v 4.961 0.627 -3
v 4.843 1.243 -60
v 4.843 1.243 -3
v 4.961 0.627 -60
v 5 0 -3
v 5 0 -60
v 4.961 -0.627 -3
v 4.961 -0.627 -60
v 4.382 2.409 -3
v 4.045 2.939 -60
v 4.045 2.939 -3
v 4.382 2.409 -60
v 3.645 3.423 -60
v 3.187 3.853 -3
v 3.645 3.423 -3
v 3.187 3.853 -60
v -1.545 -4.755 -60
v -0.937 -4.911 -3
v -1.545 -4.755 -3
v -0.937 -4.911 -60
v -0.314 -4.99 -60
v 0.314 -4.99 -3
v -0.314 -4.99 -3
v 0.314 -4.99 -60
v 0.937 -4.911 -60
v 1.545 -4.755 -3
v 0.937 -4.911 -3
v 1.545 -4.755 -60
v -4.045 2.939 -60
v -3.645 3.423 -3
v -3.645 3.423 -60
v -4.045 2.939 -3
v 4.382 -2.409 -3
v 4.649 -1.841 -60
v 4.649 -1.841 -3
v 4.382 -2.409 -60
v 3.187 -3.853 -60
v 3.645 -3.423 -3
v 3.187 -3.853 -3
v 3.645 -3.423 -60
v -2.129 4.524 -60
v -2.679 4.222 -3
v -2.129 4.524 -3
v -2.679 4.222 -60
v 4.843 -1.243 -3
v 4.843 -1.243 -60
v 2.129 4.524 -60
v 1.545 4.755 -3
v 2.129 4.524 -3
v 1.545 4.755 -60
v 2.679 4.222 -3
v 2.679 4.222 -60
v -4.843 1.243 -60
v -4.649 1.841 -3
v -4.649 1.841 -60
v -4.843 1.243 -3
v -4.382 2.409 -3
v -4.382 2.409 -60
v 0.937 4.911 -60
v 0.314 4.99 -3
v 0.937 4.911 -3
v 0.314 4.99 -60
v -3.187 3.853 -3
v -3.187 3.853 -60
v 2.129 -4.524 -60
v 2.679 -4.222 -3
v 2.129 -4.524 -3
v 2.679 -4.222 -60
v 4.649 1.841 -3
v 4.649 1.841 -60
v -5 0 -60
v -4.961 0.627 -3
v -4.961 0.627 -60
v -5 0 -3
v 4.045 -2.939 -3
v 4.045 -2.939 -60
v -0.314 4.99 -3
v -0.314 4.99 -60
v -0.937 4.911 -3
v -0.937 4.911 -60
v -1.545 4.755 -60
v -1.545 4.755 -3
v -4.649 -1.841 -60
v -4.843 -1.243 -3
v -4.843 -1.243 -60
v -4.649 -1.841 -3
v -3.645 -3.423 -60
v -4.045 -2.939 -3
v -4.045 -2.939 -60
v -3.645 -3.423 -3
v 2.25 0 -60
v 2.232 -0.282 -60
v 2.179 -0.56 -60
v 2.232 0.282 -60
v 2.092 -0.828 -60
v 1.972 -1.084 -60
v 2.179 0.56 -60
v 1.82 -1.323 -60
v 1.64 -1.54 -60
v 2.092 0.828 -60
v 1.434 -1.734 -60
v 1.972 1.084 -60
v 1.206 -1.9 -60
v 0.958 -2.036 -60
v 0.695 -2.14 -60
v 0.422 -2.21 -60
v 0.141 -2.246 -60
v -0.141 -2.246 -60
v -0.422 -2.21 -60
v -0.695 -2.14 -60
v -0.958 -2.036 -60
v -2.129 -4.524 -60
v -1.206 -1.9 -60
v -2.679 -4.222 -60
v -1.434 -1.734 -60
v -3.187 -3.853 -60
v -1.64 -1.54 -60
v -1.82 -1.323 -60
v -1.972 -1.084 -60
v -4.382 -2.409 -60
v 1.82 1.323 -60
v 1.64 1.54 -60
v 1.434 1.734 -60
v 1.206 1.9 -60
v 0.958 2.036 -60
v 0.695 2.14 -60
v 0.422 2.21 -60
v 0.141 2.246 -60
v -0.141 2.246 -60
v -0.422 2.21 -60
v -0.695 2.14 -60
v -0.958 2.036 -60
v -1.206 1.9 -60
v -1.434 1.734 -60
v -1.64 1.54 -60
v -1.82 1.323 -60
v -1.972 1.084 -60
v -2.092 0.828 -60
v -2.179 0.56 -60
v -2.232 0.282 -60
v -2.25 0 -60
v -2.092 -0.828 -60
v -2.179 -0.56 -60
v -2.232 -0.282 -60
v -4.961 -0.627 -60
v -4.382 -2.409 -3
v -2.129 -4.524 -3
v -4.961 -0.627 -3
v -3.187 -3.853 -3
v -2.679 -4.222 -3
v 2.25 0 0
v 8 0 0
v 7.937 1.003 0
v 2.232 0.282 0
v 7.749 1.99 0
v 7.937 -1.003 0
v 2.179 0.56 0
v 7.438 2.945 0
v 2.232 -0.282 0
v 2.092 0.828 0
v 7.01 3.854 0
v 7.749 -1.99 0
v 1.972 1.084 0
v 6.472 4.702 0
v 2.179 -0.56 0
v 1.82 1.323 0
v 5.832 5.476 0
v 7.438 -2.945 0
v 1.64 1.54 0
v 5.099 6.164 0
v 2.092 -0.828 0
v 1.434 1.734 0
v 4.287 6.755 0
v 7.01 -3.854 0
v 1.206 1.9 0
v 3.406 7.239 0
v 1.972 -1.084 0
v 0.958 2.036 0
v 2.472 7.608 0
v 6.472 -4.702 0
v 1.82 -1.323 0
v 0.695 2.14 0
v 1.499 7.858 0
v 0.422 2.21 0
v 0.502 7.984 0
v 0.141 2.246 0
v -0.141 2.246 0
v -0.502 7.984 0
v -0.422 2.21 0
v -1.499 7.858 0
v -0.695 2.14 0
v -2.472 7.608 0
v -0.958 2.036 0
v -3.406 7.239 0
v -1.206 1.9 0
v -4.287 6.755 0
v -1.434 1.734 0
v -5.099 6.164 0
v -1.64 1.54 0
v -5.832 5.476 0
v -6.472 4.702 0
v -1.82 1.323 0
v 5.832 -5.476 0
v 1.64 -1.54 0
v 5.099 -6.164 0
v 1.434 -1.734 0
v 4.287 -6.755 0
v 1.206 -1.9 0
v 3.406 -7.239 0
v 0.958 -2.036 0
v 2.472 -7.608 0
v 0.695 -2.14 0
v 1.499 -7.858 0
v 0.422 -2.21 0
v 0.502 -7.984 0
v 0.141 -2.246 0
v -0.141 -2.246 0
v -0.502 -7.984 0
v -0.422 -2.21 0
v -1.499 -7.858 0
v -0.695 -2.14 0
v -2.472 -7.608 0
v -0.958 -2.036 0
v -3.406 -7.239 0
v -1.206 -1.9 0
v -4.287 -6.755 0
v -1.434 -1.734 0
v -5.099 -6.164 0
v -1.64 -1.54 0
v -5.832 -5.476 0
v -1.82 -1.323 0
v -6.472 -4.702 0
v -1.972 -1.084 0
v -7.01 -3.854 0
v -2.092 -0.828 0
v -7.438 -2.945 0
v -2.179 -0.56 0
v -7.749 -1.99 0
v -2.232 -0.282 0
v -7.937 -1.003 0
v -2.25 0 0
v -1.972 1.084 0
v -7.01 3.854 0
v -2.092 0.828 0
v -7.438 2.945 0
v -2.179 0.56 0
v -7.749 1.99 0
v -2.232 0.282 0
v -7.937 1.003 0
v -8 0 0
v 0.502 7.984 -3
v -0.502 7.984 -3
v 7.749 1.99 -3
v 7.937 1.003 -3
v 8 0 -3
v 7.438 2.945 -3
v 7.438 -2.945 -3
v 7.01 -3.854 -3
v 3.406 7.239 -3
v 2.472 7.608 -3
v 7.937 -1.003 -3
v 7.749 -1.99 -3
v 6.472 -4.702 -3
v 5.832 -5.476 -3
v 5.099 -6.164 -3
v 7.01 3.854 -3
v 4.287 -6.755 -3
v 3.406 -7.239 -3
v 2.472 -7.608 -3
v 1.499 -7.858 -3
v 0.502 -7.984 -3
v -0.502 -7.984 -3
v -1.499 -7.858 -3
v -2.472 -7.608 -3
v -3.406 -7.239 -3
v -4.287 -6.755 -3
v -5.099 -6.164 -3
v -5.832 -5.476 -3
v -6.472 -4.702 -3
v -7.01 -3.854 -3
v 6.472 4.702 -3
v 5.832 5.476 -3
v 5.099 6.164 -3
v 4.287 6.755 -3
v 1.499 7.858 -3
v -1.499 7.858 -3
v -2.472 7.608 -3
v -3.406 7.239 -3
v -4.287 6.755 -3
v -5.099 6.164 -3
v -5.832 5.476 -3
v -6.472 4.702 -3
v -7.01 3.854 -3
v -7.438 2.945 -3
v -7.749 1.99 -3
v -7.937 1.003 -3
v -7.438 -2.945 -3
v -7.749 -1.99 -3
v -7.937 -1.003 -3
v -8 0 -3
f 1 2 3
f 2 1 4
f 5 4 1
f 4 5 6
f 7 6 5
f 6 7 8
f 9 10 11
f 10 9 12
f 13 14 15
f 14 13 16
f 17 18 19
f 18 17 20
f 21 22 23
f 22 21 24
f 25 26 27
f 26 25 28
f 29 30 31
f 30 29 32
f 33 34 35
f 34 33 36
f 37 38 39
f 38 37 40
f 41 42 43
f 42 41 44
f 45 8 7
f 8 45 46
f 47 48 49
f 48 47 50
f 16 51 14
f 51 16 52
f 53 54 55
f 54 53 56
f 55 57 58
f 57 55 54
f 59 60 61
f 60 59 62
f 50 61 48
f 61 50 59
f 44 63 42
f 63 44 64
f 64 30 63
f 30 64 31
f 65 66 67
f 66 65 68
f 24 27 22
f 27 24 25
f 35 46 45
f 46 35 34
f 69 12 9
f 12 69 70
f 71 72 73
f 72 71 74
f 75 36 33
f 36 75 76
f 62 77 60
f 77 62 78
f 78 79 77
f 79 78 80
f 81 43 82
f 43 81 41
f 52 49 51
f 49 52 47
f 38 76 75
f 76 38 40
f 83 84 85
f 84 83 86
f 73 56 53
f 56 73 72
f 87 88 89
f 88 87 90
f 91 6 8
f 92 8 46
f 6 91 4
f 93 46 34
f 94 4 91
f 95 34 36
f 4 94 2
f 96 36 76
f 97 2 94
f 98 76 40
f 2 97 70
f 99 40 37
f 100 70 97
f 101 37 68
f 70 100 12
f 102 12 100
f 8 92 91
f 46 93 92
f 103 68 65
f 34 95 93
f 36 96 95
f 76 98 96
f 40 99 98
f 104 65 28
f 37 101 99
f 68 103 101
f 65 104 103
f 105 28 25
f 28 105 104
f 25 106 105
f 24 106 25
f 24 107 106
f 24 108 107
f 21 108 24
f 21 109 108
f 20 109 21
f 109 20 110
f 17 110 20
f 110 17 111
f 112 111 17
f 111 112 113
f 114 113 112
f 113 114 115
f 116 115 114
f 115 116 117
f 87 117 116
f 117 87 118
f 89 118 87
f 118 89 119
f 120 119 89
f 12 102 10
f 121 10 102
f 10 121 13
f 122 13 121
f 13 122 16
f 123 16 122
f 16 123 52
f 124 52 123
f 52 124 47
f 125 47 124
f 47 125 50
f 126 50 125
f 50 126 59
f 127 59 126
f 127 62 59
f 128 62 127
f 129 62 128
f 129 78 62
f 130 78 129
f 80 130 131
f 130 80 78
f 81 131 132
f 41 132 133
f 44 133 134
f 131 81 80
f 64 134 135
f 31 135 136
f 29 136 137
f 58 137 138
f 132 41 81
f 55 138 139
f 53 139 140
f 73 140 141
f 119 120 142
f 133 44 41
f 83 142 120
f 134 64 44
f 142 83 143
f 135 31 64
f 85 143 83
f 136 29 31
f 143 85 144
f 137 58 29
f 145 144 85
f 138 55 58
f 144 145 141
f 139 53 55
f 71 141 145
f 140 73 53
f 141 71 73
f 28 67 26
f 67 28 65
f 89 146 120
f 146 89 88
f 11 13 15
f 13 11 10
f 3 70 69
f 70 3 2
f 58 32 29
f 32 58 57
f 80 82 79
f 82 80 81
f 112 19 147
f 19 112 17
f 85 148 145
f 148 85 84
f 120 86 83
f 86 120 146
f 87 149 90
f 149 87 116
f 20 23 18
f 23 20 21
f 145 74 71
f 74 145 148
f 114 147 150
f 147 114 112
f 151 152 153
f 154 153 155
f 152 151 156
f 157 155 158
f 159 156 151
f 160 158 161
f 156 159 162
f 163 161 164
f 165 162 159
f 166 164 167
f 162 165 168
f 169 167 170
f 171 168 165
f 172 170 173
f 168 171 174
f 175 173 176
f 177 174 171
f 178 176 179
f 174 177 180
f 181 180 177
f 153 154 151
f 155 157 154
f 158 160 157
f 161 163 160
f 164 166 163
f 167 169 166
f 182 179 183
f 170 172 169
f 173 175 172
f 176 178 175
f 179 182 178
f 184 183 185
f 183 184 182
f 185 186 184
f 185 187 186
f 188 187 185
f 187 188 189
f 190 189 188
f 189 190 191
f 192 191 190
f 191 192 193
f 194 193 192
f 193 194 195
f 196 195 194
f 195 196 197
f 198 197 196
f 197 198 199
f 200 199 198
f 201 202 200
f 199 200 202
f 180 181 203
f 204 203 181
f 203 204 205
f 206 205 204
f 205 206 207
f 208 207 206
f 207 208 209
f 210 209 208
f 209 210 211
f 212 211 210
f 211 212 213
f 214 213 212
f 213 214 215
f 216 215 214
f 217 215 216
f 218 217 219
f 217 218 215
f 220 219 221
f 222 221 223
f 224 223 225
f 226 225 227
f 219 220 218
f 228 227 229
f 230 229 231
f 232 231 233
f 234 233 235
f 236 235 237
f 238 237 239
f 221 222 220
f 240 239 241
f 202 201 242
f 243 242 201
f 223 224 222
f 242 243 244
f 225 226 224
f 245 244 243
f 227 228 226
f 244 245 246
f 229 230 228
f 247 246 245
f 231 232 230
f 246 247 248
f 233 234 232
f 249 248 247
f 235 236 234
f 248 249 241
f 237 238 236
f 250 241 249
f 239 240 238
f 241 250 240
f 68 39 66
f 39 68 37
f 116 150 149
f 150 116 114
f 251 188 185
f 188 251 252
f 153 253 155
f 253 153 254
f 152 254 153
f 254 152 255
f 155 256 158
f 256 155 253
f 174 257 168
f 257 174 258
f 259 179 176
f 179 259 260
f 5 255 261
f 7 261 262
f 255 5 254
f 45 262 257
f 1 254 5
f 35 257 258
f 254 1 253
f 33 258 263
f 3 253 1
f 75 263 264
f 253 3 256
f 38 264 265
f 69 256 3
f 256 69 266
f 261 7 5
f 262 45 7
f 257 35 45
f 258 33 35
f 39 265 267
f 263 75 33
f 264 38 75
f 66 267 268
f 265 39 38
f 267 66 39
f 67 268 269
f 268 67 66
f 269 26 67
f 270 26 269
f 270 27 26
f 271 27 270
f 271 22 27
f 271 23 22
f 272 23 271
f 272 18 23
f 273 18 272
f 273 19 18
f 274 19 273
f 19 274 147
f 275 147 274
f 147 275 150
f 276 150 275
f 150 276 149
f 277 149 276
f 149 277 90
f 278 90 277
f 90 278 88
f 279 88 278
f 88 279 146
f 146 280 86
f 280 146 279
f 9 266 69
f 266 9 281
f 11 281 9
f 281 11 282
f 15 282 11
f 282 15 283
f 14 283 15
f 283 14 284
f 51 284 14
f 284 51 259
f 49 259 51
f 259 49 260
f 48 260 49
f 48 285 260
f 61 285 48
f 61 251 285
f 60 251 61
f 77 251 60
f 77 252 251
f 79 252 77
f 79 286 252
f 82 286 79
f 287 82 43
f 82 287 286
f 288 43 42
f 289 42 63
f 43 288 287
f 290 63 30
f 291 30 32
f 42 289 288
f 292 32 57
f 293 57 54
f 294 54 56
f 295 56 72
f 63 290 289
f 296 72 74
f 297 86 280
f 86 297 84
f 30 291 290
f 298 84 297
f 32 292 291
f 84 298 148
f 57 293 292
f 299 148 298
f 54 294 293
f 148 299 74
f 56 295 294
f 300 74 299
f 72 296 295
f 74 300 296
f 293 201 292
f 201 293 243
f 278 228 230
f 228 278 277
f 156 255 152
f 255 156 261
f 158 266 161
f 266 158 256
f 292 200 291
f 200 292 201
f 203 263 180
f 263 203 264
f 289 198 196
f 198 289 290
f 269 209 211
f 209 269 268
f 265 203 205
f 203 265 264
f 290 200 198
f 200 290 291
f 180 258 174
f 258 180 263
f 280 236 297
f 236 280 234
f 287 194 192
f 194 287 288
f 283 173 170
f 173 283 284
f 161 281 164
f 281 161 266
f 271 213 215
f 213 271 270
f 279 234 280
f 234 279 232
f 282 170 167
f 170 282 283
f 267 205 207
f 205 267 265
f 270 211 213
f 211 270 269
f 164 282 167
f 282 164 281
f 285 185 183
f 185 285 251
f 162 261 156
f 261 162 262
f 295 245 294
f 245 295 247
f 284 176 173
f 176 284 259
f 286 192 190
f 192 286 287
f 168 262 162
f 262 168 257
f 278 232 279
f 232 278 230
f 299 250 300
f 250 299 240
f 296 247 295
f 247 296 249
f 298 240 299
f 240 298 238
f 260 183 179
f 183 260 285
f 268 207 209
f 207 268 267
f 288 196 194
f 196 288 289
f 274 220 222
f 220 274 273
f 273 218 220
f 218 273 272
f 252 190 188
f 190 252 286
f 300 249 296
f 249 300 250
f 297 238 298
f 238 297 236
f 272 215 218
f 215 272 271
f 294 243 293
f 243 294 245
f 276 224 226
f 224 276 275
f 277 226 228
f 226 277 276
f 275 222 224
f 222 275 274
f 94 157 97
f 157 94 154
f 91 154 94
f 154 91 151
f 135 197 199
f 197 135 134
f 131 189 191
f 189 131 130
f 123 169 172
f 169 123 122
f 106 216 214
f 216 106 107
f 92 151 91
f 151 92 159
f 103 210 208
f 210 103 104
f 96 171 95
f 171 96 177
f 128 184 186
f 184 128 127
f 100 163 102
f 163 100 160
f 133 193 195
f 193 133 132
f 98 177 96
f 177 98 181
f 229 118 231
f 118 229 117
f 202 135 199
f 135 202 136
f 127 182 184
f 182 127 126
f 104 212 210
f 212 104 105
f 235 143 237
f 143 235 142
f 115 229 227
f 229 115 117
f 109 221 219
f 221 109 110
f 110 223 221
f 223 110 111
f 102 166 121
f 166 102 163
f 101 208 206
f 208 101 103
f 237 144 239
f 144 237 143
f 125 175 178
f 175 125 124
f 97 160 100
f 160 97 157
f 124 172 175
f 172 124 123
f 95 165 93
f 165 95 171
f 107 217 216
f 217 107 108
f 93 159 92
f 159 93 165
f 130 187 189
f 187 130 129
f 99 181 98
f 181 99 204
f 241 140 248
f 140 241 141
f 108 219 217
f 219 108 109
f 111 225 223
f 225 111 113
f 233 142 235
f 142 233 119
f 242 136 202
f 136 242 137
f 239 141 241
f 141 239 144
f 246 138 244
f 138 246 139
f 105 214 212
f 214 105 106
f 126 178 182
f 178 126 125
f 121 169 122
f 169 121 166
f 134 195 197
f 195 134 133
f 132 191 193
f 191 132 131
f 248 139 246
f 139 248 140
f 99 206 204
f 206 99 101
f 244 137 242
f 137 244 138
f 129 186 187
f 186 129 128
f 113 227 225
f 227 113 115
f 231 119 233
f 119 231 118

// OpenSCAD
$fn = 50;


difference() {
	union() {
		translate(v = [0, 0, -60.0000000000]) {
			cylinder(h = 60, r = 5.0000000000);
		}
		translate(v = [0, 0, -3.0000000000]) {
			cylinder(h = 3, r = 8.0000000000);
		}
	}
	union() {
		#translate(v = [0, 0, -60]) {
			cylinder(h = 60, r = 2.2500000000);
		}
	}
}
